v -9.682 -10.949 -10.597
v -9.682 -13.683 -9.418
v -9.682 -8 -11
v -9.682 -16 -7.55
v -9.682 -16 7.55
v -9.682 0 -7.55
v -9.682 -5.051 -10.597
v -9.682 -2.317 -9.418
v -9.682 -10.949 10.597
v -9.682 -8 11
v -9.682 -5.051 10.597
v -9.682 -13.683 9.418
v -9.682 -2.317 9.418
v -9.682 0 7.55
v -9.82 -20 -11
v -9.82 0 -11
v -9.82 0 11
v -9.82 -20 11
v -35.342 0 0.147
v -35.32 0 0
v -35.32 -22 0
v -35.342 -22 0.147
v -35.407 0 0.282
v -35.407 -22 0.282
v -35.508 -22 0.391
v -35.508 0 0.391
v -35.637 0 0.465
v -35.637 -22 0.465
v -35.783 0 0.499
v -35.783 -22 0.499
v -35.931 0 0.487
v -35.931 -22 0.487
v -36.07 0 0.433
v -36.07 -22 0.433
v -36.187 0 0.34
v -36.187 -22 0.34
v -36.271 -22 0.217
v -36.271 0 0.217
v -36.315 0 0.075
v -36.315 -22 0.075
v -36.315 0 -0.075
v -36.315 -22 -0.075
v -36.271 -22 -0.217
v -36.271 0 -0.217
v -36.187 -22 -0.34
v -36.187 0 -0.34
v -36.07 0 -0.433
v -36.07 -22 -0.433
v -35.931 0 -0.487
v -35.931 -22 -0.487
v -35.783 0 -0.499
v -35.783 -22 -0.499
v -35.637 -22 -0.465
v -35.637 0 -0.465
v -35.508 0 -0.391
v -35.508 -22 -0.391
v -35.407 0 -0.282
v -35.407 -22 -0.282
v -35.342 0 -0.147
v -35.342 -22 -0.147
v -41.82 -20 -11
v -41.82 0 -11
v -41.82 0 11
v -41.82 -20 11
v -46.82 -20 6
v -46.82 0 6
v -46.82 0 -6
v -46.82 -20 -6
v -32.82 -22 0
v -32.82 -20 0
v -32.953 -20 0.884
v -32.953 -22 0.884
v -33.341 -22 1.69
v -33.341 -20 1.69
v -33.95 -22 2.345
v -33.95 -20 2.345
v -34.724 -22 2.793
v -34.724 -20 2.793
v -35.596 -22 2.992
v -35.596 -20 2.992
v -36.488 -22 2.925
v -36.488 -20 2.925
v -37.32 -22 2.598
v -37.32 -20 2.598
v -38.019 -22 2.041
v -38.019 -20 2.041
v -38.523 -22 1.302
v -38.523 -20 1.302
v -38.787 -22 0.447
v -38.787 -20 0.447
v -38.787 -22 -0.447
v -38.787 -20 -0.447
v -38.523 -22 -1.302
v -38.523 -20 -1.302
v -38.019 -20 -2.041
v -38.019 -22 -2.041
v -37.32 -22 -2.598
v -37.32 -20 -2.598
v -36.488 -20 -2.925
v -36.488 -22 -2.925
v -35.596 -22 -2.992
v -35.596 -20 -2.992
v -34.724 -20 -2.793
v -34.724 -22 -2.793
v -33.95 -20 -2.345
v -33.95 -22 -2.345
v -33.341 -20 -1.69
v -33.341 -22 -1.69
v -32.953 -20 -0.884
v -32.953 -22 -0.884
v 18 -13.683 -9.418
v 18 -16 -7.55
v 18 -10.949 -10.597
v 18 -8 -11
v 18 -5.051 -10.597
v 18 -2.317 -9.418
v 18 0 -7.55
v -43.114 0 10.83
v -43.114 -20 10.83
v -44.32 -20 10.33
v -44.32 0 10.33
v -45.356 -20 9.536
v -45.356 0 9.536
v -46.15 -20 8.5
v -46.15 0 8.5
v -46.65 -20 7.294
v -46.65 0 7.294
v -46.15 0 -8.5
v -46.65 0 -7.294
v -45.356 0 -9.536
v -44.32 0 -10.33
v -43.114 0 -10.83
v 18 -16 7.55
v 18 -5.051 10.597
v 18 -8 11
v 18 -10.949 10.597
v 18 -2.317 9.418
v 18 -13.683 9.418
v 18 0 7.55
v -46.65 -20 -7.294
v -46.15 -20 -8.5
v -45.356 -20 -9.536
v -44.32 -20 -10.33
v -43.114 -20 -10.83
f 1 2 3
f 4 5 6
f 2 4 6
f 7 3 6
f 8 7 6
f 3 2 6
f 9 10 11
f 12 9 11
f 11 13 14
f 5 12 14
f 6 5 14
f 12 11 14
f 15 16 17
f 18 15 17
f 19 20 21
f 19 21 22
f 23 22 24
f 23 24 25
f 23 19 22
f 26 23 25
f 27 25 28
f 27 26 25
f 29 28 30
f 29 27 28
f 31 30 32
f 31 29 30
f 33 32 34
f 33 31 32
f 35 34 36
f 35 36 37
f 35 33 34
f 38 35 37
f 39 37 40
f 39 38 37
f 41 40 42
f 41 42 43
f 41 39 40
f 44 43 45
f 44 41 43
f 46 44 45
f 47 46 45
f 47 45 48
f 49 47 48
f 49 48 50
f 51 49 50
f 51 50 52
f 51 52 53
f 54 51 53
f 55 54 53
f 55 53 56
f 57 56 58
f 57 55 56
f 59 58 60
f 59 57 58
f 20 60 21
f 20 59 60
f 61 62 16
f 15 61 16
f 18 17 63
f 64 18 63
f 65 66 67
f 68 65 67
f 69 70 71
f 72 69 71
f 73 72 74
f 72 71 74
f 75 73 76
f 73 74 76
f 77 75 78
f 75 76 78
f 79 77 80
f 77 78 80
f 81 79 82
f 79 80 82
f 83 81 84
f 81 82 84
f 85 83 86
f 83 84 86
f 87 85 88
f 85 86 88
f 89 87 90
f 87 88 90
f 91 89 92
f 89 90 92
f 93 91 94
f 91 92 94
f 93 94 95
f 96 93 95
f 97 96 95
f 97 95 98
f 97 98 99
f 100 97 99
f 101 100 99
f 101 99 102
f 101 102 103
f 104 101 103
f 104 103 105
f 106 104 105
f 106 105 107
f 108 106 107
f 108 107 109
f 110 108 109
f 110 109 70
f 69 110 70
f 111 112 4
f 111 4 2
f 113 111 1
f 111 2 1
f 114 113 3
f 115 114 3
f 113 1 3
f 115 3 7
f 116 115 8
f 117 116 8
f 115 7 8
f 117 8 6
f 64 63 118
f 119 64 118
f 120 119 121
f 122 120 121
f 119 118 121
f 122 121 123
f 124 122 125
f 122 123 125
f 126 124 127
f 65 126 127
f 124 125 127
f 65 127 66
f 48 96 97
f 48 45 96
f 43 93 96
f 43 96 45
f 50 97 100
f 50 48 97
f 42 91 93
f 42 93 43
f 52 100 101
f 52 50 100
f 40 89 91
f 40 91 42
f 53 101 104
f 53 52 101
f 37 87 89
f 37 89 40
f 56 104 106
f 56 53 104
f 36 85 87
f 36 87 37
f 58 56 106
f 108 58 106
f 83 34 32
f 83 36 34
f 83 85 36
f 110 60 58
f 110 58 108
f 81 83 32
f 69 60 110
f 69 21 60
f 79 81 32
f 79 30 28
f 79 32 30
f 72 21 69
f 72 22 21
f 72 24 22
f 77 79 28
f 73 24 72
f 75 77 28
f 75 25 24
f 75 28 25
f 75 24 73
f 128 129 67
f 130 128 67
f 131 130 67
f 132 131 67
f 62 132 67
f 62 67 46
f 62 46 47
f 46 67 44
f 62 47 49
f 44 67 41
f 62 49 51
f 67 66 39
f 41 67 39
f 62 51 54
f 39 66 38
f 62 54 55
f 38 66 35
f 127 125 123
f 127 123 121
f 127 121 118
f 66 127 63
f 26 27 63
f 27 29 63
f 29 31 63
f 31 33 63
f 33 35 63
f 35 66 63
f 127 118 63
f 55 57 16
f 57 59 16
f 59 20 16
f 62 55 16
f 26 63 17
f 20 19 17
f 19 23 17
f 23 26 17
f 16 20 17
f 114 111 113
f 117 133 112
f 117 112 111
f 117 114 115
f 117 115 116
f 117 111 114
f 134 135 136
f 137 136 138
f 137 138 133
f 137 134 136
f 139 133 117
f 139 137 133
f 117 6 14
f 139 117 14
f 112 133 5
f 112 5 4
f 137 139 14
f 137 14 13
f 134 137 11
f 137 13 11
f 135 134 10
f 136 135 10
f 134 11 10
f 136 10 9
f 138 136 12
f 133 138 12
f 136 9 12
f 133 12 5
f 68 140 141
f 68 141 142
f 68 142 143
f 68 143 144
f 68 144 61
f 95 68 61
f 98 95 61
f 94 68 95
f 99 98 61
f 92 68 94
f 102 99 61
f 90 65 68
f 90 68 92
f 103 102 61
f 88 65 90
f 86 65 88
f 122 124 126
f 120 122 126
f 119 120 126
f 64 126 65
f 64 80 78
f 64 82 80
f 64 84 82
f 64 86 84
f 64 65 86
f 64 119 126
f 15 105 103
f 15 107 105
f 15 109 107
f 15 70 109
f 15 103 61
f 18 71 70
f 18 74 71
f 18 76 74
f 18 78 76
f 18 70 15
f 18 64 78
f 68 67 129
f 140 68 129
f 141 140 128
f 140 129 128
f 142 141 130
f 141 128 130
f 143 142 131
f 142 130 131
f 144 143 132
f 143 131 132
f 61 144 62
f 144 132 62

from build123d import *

# Parameters (mm, degrees)
F0_R     = 3
F1_DEPTH = 20
F0_R_2   = 0.5
F2_DEPTH = 22
F4_DEPTH = 9.68223
F5_DEPTH = 18


with BuildPart() as f1:
    # F0 (on Front) → F1 (new body)
    with BuildSketch(Plane.XZ):
        with BuildLine():
            Line((-9.820168, 11), (-41.820168, 11))
            ThreePointArc((-41.820168, 11), (-45.355701, 9.535534), (-46.820168, 6))
            Line((-46.820168, 6), (-46.820168, -6))
            ThreePointArc((-46.820168, -6), (-45.355701, -9.535534), (-41.820168, -11))
            Line((-41.820168, -11), (-9.820168, -11))
            Line((-9.820168, -11), (-9.820168, 11))
        make_face()
        with Locations((-35.820168, 0)):
            Circle(F0_R, mode=Mode.SUBTRACT)
    extrude(amount=F1_DEPTH)

    # F0 (on Front) → F2 (join)
    with BuildSketch(Plane.XZ):
        with Locations((-35.820168, 0)):
            Circle(F0_R)
        with Locations((-35.820168, 0)):
            Circle(F0_R_2, mode=Mode.SUBTRACT)
    extrude(amount=F2_DEPTH)


with BuildPart() as f4:
    # F3 (on Right) → F4 (new body)
    with BuildSketch(Plane.YZ):
        with BuildLine():
            ThreePointArc((0, 7.549834), (-8, 11), (-16, 7.549834))
            Line((-16, 7.549834), (-16, -7.549834))
            ThreePointArc((-16, -7.549834), (-8, -11), (0, -7.549834))
            Line((0, -7.549834), (0, 7.549834))
        make_face()
    extrude(amount=-F4_DEPTH)

    # F4_face (on face) → F5 (join)
    with BuildSketch(Plane(origin=(0, -8, 0), x_dir=(0, 1, 0), z_dir=(1, 0, 0))):
        with BuildLine():
            Line((8, -7.549834), (8, 7.549834))
            ThreePointArc((8, 7.549834), (0, 11), (-8, 7.549834))
            Line((-8, 7.549834), (-8, -7.549834))
            ThreePointArc((-8, -7.549834), (0, -11), (8, -7.549834))
        make_face()
    extrude(amount=F5_DEPTH)


solid = Compound([f1.part, f4.part])
